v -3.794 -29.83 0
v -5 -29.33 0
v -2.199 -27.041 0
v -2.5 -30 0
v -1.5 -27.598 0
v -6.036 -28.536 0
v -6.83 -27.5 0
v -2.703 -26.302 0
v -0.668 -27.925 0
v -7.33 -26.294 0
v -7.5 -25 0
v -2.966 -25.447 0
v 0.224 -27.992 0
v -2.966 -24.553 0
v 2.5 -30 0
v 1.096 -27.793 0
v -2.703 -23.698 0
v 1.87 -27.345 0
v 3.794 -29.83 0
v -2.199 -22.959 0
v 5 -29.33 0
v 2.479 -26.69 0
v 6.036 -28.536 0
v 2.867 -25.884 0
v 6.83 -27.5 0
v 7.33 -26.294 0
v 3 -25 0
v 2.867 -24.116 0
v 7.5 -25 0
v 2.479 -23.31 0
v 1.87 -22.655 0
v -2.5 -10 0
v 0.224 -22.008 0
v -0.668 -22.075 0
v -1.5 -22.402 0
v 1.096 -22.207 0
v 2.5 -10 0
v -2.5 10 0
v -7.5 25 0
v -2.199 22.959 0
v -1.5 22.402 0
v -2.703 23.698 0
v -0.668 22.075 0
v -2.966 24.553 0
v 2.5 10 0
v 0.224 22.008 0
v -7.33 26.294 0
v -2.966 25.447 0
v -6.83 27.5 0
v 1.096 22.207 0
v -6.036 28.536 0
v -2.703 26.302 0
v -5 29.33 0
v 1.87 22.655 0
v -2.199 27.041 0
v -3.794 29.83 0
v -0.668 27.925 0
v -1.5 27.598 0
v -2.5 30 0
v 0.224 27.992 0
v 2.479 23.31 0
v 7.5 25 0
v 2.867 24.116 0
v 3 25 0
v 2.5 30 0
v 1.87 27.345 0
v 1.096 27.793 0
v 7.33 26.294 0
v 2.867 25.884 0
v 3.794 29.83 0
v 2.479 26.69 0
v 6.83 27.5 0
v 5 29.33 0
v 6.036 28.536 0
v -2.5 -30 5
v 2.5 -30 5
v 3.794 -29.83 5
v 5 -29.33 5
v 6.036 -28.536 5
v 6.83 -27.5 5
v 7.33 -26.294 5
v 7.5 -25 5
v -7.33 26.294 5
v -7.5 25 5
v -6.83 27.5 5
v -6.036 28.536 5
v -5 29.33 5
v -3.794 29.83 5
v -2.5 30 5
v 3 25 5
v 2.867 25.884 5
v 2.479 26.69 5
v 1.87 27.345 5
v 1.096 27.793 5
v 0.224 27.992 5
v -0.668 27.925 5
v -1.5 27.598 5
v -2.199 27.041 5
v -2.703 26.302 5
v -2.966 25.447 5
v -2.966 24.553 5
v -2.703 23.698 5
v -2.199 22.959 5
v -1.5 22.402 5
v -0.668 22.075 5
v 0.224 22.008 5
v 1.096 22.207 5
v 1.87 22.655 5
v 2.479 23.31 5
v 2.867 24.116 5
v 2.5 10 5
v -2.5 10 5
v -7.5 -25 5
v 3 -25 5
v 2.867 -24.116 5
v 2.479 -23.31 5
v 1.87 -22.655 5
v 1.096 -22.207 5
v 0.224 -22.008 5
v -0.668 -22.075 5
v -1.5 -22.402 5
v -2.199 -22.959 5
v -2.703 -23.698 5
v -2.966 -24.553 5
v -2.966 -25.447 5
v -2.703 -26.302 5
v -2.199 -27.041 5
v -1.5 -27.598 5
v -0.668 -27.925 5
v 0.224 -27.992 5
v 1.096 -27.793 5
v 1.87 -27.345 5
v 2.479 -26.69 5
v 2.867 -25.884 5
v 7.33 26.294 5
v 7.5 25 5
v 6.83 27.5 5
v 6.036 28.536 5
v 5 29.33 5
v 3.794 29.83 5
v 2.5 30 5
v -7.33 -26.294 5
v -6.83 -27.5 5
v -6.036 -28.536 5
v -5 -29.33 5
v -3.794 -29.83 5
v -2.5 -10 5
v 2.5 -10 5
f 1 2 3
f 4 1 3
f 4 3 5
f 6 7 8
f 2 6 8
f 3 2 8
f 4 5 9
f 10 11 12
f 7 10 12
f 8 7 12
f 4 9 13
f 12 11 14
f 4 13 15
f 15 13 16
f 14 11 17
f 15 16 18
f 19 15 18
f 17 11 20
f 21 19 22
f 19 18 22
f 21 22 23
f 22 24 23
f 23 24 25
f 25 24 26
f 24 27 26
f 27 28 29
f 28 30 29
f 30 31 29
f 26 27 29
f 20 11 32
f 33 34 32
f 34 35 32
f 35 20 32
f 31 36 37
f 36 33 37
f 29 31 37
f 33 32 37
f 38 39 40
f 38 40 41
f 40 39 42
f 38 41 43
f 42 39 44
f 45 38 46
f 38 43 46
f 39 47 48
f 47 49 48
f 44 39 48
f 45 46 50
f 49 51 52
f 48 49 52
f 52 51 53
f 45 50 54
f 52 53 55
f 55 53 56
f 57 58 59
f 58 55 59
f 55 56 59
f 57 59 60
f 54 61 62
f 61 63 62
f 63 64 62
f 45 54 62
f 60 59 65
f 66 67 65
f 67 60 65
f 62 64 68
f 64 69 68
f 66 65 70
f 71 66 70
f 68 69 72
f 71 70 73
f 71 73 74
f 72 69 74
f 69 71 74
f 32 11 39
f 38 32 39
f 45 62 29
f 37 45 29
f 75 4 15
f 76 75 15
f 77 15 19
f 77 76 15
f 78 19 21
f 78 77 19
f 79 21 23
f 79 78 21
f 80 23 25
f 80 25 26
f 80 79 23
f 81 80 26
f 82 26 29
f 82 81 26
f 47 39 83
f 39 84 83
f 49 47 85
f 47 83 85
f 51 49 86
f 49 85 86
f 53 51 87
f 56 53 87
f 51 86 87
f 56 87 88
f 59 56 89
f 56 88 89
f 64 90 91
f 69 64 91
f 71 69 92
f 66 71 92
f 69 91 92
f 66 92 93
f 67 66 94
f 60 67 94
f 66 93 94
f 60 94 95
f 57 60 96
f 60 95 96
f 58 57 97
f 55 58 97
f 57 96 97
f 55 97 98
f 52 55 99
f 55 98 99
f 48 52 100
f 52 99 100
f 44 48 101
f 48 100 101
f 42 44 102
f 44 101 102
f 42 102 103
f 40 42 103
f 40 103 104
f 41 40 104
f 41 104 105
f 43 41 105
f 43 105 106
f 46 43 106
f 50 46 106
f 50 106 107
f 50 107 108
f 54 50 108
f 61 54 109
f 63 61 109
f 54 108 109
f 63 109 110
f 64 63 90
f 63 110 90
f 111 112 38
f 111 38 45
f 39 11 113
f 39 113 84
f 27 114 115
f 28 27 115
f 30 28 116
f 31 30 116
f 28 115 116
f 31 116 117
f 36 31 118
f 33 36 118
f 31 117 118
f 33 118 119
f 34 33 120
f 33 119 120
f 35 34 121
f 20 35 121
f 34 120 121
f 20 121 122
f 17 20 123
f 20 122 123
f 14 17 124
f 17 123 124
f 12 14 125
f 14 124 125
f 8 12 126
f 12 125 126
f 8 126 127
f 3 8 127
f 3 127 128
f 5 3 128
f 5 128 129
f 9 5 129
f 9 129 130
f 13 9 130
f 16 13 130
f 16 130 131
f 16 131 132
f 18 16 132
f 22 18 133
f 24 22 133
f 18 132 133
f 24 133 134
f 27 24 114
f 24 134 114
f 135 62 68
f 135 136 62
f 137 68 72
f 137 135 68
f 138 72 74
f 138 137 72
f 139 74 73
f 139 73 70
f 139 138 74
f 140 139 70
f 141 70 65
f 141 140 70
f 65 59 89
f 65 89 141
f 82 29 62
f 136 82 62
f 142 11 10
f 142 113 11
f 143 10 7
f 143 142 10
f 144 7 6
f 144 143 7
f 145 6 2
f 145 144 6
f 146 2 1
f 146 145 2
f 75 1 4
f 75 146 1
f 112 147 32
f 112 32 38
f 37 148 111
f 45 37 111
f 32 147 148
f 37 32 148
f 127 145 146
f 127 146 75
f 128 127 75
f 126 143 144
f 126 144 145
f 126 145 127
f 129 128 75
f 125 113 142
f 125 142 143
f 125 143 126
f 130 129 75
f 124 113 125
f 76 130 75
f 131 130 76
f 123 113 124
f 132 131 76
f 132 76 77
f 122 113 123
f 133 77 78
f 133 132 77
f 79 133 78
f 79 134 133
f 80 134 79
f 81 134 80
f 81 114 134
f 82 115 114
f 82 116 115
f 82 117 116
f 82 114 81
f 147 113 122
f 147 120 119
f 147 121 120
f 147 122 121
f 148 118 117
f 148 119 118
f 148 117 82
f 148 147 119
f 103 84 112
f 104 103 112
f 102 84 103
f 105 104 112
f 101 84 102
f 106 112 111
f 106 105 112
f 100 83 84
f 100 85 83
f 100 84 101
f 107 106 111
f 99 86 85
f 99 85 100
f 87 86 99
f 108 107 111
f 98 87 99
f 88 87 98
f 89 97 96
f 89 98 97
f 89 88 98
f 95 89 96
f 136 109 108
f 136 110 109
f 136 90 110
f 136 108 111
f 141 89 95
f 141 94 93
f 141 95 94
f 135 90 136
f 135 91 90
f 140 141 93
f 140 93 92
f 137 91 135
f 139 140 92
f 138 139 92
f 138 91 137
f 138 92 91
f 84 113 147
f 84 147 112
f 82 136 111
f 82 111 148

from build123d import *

# Parameters (mm, degrees)
F0_W     = 15
F0_H     = 60
F1_DEPTH = 5
F2_R     = 5
F4_W     = 5
F4_H     = 20
F5_DEPTH = 5
F3_R     = 3
F6_DEPTH = 5


with BuildPart() as f1:
    # F0 (on Top) → F1 (new body)
    with BuildSketch(Plane.XY):
        Rectangle(F0_W, F0_H)
    extrude(amount=F1_DEPTH)

    # F2
    f2_edges = [f1.edges().sort_by_distance(p)[0] for p in [
        (7.5, -30, 2.5),
        (-7.5, -30, 2.5),
        (7.5, 30, 2.5),
        (-7.5, 30, 2.5),
    ]]
    fillet(f2_edges, radius=F2_R)

    # F4 (on face) → F5 (cut, through all)
    with BuildSketch(Plane.XY.offset(5)):
        Rectangle(F4_W, F4_H)
    extrude(amount=-F5_DEPTH, mode=Mode.SUBTRACT)

    # F3 (on face) → F6 (cut, through all)
    with BuildSketch(Plane.XY.offset(5)):
        with Locations((0, -25)):
            Circle(F3_R)
        with Locations((0, 25)):
            Circle(F3_R)
    extrude(amount=-F6_DEPTH, mode=Mode.SUBTRACT)


solid = f1.part
